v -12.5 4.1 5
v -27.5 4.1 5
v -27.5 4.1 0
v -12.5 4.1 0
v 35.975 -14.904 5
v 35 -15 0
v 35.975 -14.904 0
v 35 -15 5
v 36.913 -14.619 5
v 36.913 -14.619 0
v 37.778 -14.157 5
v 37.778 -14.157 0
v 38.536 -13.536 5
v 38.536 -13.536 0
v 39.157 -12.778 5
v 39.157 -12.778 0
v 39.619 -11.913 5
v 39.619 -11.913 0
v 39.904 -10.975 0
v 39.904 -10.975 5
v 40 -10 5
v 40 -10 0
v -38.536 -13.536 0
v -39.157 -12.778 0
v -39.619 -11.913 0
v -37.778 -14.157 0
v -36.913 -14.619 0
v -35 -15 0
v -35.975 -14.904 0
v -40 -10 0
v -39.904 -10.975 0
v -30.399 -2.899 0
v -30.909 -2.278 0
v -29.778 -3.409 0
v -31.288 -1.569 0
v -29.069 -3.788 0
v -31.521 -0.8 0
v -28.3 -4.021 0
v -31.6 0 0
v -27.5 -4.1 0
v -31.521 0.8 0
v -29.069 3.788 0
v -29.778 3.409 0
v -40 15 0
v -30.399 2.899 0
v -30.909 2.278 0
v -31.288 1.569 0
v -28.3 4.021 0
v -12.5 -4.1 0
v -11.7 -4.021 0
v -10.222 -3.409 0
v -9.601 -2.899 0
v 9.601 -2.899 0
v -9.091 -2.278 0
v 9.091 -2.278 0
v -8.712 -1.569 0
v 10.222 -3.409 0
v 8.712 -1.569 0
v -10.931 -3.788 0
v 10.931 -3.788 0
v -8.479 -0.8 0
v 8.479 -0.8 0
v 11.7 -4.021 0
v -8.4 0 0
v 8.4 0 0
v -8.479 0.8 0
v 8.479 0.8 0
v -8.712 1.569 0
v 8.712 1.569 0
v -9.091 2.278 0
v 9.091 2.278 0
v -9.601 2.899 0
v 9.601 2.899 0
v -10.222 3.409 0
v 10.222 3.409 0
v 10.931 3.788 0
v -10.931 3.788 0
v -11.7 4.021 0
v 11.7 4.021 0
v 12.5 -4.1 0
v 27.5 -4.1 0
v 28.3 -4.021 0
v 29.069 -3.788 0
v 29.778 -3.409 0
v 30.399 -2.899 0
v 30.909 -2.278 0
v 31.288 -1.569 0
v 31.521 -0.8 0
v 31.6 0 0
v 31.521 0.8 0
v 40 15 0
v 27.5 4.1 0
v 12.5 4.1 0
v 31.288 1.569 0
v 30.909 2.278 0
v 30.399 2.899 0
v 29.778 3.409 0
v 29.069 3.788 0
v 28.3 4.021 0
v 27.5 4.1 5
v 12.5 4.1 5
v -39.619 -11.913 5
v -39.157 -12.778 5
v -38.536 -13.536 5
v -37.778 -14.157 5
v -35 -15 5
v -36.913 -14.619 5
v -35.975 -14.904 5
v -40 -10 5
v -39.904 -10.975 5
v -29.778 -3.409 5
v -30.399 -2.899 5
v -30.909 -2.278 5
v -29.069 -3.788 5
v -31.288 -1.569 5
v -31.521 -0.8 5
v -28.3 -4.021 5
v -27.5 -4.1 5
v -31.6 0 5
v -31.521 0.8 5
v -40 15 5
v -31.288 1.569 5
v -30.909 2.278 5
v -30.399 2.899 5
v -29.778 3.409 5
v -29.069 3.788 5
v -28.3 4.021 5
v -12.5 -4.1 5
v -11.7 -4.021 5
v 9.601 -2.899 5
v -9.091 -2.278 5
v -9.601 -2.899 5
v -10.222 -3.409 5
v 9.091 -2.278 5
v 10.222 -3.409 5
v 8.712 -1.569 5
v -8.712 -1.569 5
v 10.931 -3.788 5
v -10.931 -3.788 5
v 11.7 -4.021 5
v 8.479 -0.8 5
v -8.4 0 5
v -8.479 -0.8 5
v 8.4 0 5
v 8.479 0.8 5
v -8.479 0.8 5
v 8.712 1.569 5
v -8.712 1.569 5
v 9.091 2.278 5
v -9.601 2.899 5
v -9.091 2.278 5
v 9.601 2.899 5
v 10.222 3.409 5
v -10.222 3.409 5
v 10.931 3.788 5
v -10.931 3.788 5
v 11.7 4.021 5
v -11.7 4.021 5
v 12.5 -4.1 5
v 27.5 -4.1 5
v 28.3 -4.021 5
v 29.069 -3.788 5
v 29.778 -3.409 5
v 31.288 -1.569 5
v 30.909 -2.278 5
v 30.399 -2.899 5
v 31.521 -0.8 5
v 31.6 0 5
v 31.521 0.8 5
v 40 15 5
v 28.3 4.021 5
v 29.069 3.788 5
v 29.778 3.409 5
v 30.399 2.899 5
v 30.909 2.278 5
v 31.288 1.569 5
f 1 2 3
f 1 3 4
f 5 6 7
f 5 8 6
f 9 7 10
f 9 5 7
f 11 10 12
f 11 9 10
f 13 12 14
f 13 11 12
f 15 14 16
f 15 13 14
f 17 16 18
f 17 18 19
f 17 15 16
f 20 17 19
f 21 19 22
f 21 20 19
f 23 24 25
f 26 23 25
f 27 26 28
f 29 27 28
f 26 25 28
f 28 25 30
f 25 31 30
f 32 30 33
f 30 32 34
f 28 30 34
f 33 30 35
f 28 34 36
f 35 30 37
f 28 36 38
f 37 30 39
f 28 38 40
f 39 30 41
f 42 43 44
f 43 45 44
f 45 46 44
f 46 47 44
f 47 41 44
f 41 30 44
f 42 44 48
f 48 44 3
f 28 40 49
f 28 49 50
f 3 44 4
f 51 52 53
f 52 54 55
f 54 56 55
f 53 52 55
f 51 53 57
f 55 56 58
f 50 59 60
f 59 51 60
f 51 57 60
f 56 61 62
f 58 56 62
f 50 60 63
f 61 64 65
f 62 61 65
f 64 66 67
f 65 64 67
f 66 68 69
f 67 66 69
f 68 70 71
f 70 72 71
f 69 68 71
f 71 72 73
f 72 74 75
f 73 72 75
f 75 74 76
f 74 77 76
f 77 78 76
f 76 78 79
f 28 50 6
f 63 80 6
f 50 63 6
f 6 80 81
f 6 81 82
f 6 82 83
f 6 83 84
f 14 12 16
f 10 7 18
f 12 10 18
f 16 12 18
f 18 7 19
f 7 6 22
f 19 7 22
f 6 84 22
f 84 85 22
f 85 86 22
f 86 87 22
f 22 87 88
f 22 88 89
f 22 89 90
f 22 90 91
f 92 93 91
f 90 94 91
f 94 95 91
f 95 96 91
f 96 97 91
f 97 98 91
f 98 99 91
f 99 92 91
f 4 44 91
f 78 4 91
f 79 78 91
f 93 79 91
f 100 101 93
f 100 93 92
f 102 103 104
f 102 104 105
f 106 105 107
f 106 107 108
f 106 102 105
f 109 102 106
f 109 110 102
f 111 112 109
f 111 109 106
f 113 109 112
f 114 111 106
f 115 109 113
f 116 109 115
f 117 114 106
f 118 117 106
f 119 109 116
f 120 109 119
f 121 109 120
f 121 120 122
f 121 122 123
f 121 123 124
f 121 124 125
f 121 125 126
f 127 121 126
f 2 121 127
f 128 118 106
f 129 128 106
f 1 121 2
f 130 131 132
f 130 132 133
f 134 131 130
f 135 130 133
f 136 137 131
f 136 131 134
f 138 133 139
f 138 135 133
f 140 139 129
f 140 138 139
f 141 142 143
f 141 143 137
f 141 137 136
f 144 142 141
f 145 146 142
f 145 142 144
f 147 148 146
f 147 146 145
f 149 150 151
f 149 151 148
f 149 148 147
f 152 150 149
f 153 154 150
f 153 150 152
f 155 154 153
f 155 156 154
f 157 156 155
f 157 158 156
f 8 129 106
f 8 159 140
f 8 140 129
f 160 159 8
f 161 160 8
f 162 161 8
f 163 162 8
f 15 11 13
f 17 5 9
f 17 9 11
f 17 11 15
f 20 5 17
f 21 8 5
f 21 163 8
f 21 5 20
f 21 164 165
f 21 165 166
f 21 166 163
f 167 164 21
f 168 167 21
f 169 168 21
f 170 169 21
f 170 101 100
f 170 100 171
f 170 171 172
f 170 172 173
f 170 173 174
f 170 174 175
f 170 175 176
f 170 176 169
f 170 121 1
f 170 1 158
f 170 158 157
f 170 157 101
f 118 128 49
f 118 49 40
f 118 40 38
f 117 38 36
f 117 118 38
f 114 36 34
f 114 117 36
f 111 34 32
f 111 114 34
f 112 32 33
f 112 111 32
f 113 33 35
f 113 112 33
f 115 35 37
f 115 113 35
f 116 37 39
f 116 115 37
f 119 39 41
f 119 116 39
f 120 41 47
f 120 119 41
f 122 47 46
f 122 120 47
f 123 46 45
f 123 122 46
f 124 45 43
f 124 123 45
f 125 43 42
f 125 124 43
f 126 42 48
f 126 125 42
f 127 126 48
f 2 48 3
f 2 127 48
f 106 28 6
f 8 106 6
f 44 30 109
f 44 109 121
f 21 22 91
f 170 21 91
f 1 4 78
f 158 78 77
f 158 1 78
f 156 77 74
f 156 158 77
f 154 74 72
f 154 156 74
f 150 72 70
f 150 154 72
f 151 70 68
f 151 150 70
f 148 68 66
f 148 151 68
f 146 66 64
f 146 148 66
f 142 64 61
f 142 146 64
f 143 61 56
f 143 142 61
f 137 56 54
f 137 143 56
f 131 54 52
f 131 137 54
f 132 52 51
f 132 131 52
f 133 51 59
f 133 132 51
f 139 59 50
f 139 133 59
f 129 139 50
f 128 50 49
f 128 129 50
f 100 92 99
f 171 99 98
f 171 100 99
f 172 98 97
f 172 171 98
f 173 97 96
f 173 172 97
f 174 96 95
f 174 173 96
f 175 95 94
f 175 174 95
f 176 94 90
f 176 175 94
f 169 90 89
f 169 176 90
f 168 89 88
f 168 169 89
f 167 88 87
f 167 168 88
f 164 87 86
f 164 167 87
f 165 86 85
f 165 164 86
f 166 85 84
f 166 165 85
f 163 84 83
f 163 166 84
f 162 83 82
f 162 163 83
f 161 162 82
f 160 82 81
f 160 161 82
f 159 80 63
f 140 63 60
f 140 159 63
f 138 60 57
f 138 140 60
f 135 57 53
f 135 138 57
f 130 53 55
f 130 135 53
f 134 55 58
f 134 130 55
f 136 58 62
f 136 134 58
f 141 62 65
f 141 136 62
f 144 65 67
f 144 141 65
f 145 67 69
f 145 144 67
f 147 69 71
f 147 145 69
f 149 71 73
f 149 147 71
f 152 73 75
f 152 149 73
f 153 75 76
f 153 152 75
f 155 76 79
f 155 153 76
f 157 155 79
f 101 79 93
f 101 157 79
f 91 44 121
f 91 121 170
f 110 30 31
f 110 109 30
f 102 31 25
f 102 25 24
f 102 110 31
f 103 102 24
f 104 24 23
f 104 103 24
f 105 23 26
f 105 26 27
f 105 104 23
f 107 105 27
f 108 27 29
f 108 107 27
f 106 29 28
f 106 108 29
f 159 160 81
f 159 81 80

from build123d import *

# Parameters (mm, degrees)
IZIM1_W                     = 80
IZIM1_H                     = 30
Y_KSEKLIK_EKSTR_ZYON1_DEPTH = 5
RADYUS2_R                   = 5
KES_EKSTR_ZYON1_DEPTH       = 8


with BuildPart() as part:
    # Çizim1 → Yükseklik-Ekstrüzyon1 (new body)
    with BuildSketch(Plane.XY):
        Rectangle(IZIM1_W, IZIM1_H)
    extrude(amount=Y_KSEKLIK_EKSTR_ZYON1_DEPTH)

    # Radyus2
    radyus2_edges = [part.edges().sort_by_distance(p)[0] for p in [
        (40, -15, 2.5),
        (-40, -15, 2.5),
    ]]
    fillet(radyus2_edges, radius=RADYUS2_R)

    # Çizim2 → Kes-Ekstrüzyon1 (cut)
    with BuildSketch(Plane.XY.offset(5)):
        with BuildLine():
            Line((-27.5, 4.1), (-12.5, 4.1))
            ThreePointArc((-12.5, 4.1), (-8.4, 0), (-12.5, -4.1))
            Line((-12.5, -4.1), (-27.5, -4.1))
            ThreePointArc((-27.5, -4.1), (-31.6, 0), (-27.5, 4.1))
        make_face()
        with BuildLine():
            Line((12.5, 4.1), (27.5, 4.1))
            ThreePointArc((27.5, 4.1), (31.6, 0), (27.5, -4.1))
            Line((27.5, -4.1), (12.5, -4.1))
            ThreePointArc((12.5, -4.1), (8.4, 0), (12.5, 4.1))
        make_face()
    extrude(amount=-KES_EKSTR_ZYON1_DEPTH, mode=Mode.SUBTRACT)


solid = part.part
